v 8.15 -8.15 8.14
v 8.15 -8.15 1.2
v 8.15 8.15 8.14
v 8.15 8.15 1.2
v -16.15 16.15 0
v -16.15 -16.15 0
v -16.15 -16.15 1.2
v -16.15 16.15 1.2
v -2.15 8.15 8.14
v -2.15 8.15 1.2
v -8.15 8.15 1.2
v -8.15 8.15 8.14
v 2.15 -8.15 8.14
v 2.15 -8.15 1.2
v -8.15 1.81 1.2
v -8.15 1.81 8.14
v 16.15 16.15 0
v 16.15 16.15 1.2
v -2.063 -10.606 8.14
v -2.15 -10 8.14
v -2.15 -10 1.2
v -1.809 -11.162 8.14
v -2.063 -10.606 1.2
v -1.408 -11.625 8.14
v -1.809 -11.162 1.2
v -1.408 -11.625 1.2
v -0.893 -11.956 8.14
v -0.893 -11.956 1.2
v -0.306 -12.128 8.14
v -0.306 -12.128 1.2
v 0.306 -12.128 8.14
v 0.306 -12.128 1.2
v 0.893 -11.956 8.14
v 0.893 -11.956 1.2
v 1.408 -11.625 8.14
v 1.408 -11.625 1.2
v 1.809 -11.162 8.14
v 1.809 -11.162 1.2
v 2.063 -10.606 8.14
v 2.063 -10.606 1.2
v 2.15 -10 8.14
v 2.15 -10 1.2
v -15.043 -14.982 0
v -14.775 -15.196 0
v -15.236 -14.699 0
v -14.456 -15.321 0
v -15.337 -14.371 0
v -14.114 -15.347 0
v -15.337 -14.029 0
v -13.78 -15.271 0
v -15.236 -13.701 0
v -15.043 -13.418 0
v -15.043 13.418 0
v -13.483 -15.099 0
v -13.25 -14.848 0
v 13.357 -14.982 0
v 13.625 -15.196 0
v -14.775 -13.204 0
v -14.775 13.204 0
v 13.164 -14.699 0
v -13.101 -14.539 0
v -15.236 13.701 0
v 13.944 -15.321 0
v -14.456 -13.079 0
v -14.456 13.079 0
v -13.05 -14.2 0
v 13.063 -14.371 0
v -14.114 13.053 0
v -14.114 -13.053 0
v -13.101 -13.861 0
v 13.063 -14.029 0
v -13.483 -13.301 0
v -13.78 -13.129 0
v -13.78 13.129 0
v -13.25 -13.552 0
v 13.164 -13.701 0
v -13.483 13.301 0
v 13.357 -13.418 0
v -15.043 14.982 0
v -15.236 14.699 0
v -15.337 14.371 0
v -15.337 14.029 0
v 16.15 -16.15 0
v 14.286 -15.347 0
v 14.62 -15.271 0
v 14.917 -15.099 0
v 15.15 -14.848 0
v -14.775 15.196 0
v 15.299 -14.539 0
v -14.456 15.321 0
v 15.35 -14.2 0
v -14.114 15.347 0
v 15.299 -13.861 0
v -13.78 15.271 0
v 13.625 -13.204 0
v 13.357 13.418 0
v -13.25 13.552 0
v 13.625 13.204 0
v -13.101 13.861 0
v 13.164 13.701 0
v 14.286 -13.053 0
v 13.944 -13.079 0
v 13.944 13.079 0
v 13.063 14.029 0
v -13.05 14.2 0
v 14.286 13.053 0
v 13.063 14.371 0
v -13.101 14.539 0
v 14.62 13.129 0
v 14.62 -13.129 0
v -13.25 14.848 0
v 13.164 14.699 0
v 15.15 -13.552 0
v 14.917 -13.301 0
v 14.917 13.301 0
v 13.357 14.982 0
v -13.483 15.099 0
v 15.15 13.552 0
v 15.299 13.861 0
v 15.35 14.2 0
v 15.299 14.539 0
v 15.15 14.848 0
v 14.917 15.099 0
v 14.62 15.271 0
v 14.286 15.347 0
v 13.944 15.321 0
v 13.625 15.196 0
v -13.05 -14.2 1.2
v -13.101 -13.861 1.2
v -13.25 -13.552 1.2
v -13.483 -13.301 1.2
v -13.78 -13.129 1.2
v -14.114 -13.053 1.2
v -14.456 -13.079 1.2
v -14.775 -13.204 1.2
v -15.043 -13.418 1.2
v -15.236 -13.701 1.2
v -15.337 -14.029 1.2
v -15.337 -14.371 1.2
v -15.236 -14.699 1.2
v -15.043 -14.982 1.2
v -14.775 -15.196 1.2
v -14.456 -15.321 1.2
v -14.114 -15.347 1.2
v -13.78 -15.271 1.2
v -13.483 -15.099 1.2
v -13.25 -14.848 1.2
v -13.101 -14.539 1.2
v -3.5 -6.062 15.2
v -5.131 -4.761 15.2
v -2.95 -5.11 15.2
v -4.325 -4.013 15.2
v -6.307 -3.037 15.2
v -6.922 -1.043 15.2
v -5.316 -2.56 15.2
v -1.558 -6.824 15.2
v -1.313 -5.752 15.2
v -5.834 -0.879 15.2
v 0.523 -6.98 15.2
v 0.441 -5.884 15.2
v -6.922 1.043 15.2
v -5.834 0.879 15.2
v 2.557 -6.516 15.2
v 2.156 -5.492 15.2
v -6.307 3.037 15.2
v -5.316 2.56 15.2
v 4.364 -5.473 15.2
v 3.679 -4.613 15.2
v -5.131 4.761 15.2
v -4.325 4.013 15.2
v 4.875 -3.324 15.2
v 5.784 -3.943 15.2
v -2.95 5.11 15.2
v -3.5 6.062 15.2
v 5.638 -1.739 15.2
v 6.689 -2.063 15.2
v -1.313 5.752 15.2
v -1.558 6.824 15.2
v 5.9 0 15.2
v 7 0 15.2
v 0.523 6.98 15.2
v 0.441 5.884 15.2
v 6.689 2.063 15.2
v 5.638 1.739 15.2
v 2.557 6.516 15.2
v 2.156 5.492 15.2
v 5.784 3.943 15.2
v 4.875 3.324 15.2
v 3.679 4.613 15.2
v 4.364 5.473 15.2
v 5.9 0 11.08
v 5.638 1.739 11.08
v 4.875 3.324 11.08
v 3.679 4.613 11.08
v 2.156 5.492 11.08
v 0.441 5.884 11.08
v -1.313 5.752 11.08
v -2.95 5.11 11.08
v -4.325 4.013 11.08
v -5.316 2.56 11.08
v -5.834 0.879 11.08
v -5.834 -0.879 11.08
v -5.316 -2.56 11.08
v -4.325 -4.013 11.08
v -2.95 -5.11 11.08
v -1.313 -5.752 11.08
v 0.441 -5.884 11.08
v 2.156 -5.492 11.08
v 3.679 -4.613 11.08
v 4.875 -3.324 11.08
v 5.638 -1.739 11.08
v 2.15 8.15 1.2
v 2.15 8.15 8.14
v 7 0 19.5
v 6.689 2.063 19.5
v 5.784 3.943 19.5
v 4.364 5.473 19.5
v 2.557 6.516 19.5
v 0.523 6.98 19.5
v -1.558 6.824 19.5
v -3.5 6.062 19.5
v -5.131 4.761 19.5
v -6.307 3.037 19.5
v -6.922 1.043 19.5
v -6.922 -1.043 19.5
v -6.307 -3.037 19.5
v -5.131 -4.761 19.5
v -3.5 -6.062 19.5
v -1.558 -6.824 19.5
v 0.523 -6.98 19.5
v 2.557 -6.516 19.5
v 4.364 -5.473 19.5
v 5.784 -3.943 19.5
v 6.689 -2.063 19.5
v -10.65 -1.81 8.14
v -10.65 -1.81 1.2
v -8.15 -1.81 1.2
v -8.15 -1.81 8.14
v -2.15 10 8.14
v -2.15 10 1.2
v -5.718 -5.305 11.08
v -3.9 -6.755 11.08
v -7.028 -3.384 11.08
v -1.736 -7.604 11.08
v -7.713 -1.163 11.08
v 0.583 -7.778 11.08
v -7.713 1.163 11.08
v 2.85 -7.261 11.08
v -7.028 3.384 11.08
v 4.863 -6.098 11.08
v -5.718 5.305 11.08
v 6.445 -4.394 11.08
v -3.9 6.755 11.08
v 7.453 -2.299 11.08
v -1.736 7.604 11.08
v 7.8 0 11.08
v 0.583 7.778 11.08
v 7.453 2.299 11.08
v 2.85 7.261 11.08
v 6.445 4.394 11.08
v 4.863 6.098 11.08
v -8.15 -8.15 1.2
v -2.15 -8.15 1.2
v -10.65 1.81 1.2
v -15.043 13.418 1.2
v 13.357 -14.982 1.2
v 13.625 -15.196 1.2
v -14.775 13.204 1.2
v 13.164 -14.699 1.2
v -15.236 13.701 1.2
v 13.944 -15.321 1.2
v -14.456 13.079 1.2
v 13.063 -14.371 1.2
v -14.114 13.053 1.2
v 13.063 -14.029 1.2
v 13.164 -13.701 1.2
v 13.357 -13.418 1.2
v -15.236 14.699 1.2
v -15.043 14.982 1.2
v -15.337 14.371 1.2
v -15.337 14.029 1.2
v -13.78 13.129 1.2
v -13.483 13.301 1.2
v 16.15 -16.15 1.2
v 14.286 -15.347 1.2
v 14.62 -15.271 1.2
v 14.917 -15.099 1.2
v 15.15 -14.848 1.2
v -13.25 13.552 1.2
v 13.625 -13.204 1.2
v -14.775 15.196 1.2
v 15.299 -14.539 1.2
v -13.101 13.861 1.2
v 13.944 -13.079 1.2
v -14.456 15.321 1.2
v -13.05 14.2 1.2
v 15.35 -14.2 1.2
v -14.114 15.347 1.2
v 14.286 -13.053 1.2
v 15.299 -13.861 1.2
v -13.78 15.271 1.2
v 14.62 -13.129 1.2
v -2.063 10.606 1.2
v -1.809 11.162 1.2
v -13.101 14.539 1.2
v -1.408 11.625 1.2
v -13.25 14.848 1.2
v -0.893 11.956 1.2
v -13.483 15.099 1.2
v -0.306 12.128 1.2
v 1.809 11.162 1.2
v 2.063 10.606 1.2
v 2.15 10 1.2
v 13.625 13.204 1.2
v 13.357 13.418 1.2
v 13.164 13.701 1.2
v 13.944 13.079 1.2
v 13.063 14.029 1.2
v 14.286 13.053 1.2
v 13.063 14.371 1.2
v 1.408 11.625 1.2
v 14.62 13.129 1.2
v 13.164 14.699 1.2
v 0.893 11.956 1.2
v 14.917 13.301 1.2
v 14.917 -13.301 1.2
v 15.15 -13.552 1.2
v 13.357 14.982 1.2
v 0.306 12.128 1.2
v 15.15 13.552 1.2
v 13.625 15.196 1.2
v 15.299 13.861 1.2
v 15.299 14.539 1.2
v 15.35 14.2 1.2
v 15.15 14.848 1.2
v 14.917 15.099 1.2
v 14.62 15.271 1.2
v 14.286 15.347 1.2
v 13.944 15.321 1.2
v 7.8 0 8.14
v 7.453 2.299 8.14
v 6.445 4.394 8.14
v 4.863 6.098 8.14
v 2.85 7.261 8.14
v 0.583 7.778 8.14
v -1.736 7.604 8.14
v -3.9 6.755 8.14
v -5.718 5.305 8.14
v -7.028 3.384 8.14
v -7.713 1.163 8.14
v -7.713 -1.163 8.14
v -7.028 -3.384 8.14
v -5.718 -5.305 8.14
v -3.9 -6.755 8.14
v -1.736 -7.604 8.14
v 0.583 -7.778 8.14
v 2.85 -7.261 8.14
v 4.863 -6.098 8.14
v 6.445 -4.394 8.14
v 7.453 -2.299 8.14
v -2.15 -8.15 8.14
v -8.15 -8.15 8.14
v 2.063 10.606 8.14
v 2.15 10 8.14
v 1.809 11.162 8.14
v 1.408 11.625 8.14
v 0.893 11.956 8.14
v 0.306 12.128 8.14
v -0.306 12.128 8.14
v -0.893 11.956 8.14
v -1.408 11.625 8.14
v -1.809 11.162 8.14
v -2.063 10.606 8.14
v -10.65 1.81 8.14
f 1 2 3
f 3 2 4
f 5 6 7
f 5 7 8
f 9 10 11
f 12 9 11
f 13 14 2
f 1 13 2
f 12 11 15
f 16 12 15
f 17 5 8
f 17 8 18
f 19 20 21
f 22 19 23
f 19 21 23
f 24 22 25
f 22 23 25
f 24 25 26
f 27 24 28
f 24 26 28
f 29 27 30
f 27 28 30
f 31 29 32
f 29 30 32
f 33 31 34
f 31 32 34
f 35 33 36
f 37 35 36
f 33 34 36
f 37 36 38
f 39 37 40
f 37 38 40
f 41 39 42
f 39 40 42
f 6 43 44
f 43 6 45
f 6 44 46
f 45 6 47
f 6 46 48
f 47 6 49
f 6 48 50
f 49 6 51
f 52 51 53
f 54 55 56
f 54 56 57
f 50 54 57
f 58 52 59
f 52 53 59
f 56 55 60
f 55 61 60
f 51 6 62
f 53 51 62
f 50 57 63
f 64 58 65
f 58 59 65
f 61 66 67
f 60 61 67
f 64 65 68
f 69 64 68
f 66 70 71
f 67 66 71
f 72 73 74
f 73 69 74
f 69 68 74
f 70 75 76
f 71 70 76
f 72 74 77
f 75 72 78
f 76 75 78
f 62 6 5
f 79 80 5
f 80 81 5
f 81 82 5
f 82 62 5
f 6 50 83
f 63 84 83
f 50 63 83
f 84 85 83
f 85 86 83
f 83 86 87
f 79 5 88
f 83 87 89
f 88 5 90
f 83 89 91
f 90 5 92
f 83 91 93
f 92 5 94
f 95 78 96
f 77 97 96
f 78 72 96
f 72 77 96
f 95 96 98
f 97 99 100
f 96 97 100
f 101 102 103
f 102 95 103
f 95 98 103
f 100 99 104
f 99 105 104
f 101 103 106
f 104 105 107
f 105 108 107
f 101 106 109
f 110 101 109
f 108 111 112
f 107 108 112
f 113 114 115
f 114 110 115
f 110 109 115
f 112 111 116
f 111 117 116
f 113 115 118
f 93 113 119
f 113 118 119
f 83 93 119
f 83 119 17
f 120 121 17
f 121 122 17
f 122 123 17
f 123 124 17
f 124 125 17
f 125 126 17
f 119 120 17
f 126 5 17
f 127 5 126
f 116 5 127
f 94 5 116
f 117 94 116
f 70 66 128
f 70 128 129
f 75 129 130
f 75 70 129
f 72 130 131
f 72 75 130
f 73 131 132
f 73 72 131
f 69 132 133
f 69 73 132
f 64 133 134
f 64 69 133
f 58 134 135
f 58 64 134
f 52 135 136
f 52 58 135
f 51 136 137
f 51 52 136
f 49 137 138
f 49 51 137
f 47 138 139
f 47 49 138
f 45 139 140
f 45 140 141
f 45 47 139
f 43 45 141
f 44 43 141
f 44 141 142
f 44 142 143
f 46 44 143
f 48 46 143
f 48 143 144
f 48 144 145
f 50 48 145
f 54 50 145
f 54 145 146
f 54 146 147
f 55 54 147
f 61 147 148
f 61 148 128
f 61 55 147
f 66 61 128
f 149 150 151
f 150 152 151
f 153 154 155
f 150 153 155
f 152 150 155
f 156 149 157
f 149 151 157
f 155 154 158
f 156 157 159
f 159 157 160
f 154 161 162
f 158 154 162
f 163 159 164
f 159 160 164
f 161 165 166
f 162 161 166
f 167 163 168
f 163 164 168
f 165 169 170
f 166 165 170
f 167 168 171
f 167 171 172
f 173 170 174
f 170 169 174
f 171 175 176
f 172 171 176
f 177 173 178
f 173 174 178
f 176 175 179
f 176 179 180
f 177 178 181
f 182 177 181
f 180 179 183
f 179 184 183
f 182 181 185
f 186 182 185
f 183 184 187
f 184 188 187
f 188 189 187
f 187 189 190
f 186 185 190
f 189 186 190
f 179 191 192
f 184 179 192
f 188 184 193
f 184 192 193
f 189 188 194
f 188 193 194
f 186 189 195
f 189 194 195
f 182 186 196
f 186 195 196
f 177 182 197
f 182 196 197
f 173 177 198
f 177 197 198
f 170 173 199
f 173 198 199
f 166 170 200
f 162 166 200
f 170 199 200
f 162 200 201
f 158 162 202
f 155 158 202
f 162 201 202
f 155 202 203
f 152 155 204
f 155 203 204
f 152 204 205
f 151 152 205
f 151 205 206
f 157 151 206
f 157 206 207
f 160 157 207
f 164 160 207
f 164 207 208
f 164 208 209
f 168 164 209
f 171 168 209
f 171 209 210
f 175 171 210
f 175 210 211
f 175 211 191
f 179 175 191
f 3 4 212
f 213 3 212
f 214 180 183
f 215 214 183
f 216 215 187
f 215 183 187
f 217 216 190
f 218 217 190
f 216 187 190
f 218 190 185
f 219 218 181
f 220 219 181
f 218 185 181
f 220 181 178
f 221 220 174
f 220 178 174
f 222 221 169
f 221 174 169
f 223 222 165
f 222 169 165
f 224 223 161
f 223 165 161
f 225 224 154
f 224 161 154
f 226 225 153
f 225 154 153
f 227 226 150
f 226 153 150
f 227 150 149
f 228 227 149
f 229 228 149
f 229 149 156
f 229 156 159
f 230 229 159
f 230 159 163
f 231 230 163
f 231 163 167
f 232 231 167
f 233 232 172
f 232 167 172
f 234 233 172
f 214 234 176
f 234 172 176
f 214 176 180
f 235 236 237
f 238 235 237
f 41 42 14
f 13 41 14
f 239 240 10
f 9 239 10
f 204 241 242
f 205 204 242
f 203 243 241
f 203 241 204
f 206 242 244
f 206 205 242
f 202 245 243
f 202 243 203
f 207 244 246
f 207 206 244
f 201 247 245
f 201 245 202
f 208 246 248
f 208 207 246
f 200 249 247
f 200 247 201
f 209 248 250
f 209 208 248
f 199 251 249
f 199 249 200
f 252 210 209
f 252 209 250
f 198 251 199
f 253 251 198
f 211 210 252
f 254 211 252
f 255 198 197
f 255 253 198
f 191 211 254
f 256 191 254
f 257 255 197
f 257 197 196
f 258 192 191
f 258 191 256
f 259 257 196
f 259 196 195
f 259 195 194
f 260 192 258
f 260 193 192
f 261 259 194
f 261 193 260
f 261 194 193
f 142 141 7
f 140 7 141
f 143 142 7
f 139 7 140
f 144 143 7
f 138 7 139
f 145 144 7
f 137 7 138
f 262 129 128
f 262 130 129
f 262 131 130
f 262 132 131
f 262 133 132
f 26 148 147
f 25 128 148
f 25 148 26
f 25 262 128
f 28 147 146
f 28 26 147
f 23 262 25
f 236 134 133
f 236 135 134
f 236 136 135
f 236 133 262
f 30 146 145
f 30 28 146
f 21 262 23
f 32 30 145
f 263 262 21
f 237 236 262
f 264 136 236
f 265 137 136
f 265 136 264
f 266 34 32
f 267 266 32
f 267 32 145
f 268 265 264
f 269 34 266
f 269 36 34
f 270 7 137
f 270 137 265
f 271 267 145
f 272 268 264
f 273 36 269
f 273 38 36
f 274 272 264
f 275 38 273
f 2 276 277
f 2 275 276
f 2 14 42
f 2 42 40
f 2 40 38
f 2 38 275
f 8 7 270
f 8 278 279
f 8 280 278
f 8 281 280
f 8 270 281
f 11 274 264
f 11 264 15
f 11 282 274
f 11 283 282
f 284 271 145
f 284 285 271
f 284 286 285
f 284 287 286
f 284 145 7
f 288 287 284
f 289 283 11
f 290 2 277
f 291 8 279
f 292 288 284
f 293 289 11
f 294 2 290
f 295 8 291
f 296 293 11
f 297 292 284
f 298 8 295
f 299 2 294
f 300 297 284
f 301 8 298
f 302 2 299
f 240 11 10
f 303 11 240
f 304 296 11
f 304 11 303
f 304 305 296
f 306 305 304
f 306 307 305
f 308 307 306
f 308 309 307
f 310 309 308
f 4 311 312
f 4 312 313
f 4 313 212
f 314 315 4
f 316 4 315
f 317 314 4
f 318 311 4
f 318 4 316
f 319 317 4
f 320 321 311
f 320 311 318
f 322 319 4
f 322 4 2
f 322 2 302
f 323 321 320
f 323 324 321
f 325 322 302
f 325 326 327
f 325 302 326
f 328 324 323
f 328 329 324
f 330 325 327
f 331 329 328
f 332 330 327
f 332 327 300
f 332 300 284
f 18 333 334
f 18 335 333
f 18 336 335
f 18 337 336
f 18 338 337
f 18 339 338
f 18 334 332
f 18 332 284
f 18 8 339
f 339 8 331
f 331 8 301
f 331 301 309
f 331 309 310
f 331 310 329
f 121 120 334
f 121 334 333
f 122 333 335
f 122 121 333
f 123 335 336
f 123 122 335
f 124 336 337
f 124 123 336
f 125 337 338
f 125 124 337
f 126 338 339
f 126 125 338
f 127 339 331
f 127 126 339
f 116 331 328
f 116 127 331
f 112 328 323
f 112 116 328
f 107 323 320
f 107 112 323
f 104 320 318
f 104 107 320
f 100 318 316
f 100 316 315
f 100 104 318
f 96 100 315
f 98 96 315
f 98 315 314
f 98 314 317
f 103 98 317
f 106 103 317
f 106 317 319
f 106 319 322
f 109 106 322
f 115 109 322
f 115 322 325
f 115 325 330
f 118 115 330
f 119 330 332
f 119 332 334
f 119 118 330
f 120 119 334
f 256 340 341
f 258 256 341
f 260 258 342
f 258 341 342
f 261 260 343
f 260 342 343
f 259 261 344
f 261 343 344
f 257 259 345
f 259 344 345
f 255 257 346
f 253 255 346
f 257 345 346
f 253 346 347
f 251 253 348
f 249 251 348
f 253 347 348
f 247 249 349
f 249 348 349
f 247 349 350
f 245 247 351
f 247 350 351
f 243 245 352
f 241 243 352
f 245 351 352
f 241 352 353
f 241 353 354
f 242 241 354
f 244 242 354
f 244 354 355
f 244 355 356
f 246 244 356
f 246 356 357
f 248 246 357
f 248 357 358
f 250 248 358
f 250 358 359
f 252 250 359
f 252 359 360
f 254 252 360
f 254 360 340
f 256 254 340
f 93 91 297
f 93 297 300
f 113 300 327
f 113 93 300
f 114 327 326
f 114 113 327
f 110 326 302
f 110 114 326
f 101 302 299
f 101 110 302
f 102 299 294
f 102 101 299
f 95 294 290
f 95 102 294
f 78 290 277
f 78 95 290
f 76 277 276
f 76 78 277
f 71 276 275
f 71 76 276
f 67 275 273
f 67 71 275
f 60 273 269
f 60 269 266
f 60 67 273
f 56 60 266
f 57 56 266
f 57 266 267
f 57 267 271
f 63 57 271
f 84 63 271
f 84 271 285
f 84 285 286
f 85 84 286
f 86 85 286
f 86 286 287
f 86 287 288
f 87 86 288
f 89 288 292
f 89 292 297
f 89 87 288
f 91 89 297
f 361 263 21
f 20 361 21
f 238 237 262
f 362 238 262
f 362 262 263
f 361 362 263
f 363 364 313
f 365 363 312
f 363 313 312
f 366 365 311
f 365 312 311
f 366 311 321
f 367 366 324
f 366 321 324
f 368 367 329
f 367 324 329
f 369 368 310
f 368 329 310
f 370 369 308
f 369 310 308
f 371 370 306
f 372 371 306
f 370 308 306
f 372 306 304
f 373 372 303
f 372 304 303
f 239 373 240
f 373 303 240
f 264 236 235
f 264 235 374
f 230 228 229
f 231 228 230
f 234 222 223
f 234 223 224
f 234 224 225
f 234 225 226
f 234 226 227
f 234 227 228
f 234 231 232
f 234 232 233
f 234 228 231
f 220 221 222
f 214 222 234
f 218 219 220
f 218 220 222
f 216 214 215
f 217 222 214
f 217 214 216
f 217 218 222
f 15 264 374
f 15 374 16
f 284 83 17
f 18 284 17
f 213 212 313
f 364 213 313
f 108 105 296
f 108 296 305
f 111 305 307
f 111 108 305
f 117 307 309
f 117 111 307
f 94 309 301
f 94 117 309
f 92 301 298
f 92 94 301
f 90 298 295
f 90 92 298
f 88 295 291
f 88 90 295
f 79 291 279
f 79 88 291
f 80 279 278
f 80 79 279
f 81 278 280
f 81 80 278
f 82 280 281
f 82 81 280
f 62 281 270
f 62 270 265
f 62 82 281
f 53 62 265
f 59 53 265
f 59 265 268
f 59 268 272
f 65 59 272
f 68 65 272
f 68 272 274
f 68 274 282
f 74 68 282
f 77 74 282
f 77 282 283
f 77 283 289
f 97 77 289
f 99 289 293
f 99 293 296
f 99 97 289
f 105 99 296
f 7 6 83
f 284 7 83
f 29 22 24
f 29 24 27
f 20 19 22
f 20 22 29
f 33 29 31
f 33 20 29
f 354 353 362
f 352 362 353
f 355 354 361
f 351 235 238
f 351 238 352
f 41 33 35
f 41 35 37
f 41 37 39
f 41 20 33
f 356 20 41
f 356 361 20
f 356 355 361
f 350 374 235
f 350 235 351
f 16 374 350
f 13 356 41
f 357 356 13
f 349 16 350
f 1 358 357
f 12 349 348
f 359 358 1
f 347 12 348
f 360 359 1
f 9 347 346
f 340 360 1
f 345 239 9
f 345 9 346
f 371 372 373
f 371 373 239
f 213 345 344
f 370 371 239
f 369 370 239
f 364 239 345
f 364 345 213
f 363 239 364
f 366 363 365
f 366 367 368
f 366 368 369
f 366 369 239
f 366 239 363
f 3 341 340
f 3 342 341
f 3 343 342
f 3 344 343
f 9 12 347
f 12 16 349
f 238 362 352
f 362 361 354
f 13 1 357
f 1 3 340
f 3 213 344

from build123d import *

# Parameters (mm, degrees)
F0_W     = 32.3
F0_H     = 32.3
F0_R     = 1.15
F1_DEPTH = 1.2
F0_R_2   = 7.8
F0_W_2   = 2.5
F0_H_2   = 3.62
F2_DEPTH = 8.14
F3_DEPTH = 11.08
F4_R     = 5.9
F5_DEPTH = 19.5
F6_START = 15.2
F4_R_2   = 7
F6_DEPTH = 4.3


with BuildPart() as f1:
    # F0 (on Top) → F1 (new body)
    with BuildSketch(Plane.XY):
        Rectangle(F0_W, F0_H)
        with Locations((-14.2, -14.2)):
            Circle(F0_R, mode=Mode.SUBTRACT)
        with Locations((14.2, -14.2)):
            Circle(F0_R, mode=Mode.SUBTRACT)
        with BuildLine():
            Line((-8.15, 1.81), (-8.15, 8.15))
            Line((-8.15, 8.15), (-2.15, 8.15))
            Line((-2.15, 8.15), (-2.15, 10))
            ThreePointArc((-2.15, 10), (0, 12.15), (2.15, 10))
            Line((2.15, 10), (2.15, 8.15))
            Line((2.15, 8.15), (8.15, 8.15))
            Line((8.15, 8.15), (8.15, -8.15))
            Line((8.15, -8.15), (2.15, -8.15))
            Line((2.15, -8.15), (2.15, -10))
            ThreePointArc((2.15, -10), (0, -12.15), (-2.15, -10))
            Line((-2.15, -10), (-2.15, -8.15))
            Line((-2.15, -8.15), (-8.15, -8.15))
            Line((-8.15, -8.15), (-8.15, -1.81))
            Line((-8.15, -1.81), (-10.65, -1.81))
            Line((-10.65, -1.81), (-10.65, 1.81))
            Line((-10.65, 1.81), (-8.15, 1.81))
        make_face(mode=Mode.SUBTRACT)
        with Locations((-14.2, 14.2)):
            Circle(F0_R, mode=Mode.SUBTRACT)
        with Locations((14.2, 14.2)):
            Circle(F0_R, mode=Mode.SUBTRACT)
    extrude(amount=F1_DEPTH)

    # F0 (on Top) → F2 (join)
    with BuildSketch(Plane.XY):
        with BuildLine():
            Line((1.095445115, 8.15), (-1.095445115, 8.15))
            ThreePointArc((-1.095445115, 8.15), (0, 7.85), (1.095445115, 8.15))
        make_face()
        with BuildLine():
            ThreePointArc((1.095445115, -8.15), (0, -7.85), (-1.095445115, -8.15))
            Line((-1.095445115, -8.15), (1.095445115, -8.15))
        make_face()
        with BuildLine():
            Line((-1.095445115, -8.15), (-2.15, -8.15))
            Line((-2.15, -8.15), (-2.15, -10))
            ThreePointArc((-2.15, -10), (-1.86784729, -8.9352716302), (-1.095445115, -8.15))
        make_face()
        with BuildLine():
            Line((2.15, -8.15), (1.095445115, -8.15))
            ThreePointArc((1.095445115, -8.15), (1.86784729, -8.9352716302), (2.15, -10))
            Line((2.15, -10), (2.15, -8.15))
        make_face()
        with BuildLine():
            Line((1.095445115, -8.15), (-1.095445115, -8.15))
            ThreePointArc((-1.095445115, -8.15), (-1.86784729, -8.9352716302), (-2.15, -10))
            ThreePointArc((-2.15, -10), (0, -12.15), (2.15, -10))
            ThreePointArc((2.15, -10), (1.86784729, -8.9352716302), (1.095445115, -8.15))
        make_face()
        with BuildLine():
            ThreePointArc((2.15, 10), (1.86784729, 8.9352716302), (1.095445115, 8.15))
            Line((1.095445115, 8.15), (2.15, 8.15))
            Line((2.15, 8.15), (2.15, 10))
        make_face()
        with BuildLine():
            Line((-2.15, 10), (-2.15, 8.15))
            Line((-2.15, 8.15), (-1.095445115, 8.15))
            ThreePointArc((-1.095445115, 8.15), (-1.86784729, 8.9352716302), (-2.15, 10))
        make_face()
        with BuildLine():
            ThreePointArc((-2.15, 10), (-1.86784729, 8.9352716302), (-1.095445115, 8.15))
            Line((-1.095445115, 8.15), (1.095445115, 8.15))
            ThreePointArc((1.095445115, 8.15), (1.86784729, 8.9352716302), (2.15, 10))
            ThreePointArc((2.15, 10), (0, 12.15), (-2.15, 10))
        make_face()
        with BuildLine():
            Line((-2.15, 8.15), (-8.15, 8.15))
            Line((-8.15, 8.15), (-8.15, 1.81))
            Line((-8.15, 1.81), (-8.15, -1.81))
            Line((-8.15, -1.81), (-8.15, -8.15))
            Line((-8.15, -8.15), (-2.15, -8.15))
            Line((-2.15, -8.15), (-1.095445115, -8.15))
            ThreePointArc((-1.095445115, -8.15), (0, -7.85), (1.095445115, -8.15))
            Line((1.095445115, -8.15), (2.15, -8.15))
            Line((2.15, -8.15), (8.15, -8.15))
            Line((8.15, -8.15), (8.15, 8.15))
            Line((8.15, 8.15), (2.15, 8.15))
            Line((2.15, 8.15), (1.095445115, 8.15))
            ThreePointArc((1.095445115, 8.15), (0, 7.85), (-1.095445115, 8.15))
            Line((-1.095445115, 8.15), (-2.15, 8.15))
        make_face()
        Circle(F0_R_2, mode=Mode.SUBTRACT)
        with Locations((-9.4, 0)):
            Rectangle(F0_W_2, F0_H_2)
    extrude(amount=F2_DEPTH)

    # F0 (on Top) → F3 (join)
    with BuildSketch(Plane.XY):
        Circle(F0_R_2)
    extrude(amount=F3_DEPTH)

    # F4 (on Top) → F5 (join)
    with BuildSketch(Plane.XY):
        Circle(F4_R)
    extrude(amount=F5_DEPTH)

    # F4 (on Top) → F6 (join)
    with BuildSketch(Plane.XY.offset(F6_START)):
        Circle(F4_R_2)
        Circle(F4_R, mode=Mode.SUBTRACT)
    extrude(amount=F6_DEPTH)


solid = f1.part
